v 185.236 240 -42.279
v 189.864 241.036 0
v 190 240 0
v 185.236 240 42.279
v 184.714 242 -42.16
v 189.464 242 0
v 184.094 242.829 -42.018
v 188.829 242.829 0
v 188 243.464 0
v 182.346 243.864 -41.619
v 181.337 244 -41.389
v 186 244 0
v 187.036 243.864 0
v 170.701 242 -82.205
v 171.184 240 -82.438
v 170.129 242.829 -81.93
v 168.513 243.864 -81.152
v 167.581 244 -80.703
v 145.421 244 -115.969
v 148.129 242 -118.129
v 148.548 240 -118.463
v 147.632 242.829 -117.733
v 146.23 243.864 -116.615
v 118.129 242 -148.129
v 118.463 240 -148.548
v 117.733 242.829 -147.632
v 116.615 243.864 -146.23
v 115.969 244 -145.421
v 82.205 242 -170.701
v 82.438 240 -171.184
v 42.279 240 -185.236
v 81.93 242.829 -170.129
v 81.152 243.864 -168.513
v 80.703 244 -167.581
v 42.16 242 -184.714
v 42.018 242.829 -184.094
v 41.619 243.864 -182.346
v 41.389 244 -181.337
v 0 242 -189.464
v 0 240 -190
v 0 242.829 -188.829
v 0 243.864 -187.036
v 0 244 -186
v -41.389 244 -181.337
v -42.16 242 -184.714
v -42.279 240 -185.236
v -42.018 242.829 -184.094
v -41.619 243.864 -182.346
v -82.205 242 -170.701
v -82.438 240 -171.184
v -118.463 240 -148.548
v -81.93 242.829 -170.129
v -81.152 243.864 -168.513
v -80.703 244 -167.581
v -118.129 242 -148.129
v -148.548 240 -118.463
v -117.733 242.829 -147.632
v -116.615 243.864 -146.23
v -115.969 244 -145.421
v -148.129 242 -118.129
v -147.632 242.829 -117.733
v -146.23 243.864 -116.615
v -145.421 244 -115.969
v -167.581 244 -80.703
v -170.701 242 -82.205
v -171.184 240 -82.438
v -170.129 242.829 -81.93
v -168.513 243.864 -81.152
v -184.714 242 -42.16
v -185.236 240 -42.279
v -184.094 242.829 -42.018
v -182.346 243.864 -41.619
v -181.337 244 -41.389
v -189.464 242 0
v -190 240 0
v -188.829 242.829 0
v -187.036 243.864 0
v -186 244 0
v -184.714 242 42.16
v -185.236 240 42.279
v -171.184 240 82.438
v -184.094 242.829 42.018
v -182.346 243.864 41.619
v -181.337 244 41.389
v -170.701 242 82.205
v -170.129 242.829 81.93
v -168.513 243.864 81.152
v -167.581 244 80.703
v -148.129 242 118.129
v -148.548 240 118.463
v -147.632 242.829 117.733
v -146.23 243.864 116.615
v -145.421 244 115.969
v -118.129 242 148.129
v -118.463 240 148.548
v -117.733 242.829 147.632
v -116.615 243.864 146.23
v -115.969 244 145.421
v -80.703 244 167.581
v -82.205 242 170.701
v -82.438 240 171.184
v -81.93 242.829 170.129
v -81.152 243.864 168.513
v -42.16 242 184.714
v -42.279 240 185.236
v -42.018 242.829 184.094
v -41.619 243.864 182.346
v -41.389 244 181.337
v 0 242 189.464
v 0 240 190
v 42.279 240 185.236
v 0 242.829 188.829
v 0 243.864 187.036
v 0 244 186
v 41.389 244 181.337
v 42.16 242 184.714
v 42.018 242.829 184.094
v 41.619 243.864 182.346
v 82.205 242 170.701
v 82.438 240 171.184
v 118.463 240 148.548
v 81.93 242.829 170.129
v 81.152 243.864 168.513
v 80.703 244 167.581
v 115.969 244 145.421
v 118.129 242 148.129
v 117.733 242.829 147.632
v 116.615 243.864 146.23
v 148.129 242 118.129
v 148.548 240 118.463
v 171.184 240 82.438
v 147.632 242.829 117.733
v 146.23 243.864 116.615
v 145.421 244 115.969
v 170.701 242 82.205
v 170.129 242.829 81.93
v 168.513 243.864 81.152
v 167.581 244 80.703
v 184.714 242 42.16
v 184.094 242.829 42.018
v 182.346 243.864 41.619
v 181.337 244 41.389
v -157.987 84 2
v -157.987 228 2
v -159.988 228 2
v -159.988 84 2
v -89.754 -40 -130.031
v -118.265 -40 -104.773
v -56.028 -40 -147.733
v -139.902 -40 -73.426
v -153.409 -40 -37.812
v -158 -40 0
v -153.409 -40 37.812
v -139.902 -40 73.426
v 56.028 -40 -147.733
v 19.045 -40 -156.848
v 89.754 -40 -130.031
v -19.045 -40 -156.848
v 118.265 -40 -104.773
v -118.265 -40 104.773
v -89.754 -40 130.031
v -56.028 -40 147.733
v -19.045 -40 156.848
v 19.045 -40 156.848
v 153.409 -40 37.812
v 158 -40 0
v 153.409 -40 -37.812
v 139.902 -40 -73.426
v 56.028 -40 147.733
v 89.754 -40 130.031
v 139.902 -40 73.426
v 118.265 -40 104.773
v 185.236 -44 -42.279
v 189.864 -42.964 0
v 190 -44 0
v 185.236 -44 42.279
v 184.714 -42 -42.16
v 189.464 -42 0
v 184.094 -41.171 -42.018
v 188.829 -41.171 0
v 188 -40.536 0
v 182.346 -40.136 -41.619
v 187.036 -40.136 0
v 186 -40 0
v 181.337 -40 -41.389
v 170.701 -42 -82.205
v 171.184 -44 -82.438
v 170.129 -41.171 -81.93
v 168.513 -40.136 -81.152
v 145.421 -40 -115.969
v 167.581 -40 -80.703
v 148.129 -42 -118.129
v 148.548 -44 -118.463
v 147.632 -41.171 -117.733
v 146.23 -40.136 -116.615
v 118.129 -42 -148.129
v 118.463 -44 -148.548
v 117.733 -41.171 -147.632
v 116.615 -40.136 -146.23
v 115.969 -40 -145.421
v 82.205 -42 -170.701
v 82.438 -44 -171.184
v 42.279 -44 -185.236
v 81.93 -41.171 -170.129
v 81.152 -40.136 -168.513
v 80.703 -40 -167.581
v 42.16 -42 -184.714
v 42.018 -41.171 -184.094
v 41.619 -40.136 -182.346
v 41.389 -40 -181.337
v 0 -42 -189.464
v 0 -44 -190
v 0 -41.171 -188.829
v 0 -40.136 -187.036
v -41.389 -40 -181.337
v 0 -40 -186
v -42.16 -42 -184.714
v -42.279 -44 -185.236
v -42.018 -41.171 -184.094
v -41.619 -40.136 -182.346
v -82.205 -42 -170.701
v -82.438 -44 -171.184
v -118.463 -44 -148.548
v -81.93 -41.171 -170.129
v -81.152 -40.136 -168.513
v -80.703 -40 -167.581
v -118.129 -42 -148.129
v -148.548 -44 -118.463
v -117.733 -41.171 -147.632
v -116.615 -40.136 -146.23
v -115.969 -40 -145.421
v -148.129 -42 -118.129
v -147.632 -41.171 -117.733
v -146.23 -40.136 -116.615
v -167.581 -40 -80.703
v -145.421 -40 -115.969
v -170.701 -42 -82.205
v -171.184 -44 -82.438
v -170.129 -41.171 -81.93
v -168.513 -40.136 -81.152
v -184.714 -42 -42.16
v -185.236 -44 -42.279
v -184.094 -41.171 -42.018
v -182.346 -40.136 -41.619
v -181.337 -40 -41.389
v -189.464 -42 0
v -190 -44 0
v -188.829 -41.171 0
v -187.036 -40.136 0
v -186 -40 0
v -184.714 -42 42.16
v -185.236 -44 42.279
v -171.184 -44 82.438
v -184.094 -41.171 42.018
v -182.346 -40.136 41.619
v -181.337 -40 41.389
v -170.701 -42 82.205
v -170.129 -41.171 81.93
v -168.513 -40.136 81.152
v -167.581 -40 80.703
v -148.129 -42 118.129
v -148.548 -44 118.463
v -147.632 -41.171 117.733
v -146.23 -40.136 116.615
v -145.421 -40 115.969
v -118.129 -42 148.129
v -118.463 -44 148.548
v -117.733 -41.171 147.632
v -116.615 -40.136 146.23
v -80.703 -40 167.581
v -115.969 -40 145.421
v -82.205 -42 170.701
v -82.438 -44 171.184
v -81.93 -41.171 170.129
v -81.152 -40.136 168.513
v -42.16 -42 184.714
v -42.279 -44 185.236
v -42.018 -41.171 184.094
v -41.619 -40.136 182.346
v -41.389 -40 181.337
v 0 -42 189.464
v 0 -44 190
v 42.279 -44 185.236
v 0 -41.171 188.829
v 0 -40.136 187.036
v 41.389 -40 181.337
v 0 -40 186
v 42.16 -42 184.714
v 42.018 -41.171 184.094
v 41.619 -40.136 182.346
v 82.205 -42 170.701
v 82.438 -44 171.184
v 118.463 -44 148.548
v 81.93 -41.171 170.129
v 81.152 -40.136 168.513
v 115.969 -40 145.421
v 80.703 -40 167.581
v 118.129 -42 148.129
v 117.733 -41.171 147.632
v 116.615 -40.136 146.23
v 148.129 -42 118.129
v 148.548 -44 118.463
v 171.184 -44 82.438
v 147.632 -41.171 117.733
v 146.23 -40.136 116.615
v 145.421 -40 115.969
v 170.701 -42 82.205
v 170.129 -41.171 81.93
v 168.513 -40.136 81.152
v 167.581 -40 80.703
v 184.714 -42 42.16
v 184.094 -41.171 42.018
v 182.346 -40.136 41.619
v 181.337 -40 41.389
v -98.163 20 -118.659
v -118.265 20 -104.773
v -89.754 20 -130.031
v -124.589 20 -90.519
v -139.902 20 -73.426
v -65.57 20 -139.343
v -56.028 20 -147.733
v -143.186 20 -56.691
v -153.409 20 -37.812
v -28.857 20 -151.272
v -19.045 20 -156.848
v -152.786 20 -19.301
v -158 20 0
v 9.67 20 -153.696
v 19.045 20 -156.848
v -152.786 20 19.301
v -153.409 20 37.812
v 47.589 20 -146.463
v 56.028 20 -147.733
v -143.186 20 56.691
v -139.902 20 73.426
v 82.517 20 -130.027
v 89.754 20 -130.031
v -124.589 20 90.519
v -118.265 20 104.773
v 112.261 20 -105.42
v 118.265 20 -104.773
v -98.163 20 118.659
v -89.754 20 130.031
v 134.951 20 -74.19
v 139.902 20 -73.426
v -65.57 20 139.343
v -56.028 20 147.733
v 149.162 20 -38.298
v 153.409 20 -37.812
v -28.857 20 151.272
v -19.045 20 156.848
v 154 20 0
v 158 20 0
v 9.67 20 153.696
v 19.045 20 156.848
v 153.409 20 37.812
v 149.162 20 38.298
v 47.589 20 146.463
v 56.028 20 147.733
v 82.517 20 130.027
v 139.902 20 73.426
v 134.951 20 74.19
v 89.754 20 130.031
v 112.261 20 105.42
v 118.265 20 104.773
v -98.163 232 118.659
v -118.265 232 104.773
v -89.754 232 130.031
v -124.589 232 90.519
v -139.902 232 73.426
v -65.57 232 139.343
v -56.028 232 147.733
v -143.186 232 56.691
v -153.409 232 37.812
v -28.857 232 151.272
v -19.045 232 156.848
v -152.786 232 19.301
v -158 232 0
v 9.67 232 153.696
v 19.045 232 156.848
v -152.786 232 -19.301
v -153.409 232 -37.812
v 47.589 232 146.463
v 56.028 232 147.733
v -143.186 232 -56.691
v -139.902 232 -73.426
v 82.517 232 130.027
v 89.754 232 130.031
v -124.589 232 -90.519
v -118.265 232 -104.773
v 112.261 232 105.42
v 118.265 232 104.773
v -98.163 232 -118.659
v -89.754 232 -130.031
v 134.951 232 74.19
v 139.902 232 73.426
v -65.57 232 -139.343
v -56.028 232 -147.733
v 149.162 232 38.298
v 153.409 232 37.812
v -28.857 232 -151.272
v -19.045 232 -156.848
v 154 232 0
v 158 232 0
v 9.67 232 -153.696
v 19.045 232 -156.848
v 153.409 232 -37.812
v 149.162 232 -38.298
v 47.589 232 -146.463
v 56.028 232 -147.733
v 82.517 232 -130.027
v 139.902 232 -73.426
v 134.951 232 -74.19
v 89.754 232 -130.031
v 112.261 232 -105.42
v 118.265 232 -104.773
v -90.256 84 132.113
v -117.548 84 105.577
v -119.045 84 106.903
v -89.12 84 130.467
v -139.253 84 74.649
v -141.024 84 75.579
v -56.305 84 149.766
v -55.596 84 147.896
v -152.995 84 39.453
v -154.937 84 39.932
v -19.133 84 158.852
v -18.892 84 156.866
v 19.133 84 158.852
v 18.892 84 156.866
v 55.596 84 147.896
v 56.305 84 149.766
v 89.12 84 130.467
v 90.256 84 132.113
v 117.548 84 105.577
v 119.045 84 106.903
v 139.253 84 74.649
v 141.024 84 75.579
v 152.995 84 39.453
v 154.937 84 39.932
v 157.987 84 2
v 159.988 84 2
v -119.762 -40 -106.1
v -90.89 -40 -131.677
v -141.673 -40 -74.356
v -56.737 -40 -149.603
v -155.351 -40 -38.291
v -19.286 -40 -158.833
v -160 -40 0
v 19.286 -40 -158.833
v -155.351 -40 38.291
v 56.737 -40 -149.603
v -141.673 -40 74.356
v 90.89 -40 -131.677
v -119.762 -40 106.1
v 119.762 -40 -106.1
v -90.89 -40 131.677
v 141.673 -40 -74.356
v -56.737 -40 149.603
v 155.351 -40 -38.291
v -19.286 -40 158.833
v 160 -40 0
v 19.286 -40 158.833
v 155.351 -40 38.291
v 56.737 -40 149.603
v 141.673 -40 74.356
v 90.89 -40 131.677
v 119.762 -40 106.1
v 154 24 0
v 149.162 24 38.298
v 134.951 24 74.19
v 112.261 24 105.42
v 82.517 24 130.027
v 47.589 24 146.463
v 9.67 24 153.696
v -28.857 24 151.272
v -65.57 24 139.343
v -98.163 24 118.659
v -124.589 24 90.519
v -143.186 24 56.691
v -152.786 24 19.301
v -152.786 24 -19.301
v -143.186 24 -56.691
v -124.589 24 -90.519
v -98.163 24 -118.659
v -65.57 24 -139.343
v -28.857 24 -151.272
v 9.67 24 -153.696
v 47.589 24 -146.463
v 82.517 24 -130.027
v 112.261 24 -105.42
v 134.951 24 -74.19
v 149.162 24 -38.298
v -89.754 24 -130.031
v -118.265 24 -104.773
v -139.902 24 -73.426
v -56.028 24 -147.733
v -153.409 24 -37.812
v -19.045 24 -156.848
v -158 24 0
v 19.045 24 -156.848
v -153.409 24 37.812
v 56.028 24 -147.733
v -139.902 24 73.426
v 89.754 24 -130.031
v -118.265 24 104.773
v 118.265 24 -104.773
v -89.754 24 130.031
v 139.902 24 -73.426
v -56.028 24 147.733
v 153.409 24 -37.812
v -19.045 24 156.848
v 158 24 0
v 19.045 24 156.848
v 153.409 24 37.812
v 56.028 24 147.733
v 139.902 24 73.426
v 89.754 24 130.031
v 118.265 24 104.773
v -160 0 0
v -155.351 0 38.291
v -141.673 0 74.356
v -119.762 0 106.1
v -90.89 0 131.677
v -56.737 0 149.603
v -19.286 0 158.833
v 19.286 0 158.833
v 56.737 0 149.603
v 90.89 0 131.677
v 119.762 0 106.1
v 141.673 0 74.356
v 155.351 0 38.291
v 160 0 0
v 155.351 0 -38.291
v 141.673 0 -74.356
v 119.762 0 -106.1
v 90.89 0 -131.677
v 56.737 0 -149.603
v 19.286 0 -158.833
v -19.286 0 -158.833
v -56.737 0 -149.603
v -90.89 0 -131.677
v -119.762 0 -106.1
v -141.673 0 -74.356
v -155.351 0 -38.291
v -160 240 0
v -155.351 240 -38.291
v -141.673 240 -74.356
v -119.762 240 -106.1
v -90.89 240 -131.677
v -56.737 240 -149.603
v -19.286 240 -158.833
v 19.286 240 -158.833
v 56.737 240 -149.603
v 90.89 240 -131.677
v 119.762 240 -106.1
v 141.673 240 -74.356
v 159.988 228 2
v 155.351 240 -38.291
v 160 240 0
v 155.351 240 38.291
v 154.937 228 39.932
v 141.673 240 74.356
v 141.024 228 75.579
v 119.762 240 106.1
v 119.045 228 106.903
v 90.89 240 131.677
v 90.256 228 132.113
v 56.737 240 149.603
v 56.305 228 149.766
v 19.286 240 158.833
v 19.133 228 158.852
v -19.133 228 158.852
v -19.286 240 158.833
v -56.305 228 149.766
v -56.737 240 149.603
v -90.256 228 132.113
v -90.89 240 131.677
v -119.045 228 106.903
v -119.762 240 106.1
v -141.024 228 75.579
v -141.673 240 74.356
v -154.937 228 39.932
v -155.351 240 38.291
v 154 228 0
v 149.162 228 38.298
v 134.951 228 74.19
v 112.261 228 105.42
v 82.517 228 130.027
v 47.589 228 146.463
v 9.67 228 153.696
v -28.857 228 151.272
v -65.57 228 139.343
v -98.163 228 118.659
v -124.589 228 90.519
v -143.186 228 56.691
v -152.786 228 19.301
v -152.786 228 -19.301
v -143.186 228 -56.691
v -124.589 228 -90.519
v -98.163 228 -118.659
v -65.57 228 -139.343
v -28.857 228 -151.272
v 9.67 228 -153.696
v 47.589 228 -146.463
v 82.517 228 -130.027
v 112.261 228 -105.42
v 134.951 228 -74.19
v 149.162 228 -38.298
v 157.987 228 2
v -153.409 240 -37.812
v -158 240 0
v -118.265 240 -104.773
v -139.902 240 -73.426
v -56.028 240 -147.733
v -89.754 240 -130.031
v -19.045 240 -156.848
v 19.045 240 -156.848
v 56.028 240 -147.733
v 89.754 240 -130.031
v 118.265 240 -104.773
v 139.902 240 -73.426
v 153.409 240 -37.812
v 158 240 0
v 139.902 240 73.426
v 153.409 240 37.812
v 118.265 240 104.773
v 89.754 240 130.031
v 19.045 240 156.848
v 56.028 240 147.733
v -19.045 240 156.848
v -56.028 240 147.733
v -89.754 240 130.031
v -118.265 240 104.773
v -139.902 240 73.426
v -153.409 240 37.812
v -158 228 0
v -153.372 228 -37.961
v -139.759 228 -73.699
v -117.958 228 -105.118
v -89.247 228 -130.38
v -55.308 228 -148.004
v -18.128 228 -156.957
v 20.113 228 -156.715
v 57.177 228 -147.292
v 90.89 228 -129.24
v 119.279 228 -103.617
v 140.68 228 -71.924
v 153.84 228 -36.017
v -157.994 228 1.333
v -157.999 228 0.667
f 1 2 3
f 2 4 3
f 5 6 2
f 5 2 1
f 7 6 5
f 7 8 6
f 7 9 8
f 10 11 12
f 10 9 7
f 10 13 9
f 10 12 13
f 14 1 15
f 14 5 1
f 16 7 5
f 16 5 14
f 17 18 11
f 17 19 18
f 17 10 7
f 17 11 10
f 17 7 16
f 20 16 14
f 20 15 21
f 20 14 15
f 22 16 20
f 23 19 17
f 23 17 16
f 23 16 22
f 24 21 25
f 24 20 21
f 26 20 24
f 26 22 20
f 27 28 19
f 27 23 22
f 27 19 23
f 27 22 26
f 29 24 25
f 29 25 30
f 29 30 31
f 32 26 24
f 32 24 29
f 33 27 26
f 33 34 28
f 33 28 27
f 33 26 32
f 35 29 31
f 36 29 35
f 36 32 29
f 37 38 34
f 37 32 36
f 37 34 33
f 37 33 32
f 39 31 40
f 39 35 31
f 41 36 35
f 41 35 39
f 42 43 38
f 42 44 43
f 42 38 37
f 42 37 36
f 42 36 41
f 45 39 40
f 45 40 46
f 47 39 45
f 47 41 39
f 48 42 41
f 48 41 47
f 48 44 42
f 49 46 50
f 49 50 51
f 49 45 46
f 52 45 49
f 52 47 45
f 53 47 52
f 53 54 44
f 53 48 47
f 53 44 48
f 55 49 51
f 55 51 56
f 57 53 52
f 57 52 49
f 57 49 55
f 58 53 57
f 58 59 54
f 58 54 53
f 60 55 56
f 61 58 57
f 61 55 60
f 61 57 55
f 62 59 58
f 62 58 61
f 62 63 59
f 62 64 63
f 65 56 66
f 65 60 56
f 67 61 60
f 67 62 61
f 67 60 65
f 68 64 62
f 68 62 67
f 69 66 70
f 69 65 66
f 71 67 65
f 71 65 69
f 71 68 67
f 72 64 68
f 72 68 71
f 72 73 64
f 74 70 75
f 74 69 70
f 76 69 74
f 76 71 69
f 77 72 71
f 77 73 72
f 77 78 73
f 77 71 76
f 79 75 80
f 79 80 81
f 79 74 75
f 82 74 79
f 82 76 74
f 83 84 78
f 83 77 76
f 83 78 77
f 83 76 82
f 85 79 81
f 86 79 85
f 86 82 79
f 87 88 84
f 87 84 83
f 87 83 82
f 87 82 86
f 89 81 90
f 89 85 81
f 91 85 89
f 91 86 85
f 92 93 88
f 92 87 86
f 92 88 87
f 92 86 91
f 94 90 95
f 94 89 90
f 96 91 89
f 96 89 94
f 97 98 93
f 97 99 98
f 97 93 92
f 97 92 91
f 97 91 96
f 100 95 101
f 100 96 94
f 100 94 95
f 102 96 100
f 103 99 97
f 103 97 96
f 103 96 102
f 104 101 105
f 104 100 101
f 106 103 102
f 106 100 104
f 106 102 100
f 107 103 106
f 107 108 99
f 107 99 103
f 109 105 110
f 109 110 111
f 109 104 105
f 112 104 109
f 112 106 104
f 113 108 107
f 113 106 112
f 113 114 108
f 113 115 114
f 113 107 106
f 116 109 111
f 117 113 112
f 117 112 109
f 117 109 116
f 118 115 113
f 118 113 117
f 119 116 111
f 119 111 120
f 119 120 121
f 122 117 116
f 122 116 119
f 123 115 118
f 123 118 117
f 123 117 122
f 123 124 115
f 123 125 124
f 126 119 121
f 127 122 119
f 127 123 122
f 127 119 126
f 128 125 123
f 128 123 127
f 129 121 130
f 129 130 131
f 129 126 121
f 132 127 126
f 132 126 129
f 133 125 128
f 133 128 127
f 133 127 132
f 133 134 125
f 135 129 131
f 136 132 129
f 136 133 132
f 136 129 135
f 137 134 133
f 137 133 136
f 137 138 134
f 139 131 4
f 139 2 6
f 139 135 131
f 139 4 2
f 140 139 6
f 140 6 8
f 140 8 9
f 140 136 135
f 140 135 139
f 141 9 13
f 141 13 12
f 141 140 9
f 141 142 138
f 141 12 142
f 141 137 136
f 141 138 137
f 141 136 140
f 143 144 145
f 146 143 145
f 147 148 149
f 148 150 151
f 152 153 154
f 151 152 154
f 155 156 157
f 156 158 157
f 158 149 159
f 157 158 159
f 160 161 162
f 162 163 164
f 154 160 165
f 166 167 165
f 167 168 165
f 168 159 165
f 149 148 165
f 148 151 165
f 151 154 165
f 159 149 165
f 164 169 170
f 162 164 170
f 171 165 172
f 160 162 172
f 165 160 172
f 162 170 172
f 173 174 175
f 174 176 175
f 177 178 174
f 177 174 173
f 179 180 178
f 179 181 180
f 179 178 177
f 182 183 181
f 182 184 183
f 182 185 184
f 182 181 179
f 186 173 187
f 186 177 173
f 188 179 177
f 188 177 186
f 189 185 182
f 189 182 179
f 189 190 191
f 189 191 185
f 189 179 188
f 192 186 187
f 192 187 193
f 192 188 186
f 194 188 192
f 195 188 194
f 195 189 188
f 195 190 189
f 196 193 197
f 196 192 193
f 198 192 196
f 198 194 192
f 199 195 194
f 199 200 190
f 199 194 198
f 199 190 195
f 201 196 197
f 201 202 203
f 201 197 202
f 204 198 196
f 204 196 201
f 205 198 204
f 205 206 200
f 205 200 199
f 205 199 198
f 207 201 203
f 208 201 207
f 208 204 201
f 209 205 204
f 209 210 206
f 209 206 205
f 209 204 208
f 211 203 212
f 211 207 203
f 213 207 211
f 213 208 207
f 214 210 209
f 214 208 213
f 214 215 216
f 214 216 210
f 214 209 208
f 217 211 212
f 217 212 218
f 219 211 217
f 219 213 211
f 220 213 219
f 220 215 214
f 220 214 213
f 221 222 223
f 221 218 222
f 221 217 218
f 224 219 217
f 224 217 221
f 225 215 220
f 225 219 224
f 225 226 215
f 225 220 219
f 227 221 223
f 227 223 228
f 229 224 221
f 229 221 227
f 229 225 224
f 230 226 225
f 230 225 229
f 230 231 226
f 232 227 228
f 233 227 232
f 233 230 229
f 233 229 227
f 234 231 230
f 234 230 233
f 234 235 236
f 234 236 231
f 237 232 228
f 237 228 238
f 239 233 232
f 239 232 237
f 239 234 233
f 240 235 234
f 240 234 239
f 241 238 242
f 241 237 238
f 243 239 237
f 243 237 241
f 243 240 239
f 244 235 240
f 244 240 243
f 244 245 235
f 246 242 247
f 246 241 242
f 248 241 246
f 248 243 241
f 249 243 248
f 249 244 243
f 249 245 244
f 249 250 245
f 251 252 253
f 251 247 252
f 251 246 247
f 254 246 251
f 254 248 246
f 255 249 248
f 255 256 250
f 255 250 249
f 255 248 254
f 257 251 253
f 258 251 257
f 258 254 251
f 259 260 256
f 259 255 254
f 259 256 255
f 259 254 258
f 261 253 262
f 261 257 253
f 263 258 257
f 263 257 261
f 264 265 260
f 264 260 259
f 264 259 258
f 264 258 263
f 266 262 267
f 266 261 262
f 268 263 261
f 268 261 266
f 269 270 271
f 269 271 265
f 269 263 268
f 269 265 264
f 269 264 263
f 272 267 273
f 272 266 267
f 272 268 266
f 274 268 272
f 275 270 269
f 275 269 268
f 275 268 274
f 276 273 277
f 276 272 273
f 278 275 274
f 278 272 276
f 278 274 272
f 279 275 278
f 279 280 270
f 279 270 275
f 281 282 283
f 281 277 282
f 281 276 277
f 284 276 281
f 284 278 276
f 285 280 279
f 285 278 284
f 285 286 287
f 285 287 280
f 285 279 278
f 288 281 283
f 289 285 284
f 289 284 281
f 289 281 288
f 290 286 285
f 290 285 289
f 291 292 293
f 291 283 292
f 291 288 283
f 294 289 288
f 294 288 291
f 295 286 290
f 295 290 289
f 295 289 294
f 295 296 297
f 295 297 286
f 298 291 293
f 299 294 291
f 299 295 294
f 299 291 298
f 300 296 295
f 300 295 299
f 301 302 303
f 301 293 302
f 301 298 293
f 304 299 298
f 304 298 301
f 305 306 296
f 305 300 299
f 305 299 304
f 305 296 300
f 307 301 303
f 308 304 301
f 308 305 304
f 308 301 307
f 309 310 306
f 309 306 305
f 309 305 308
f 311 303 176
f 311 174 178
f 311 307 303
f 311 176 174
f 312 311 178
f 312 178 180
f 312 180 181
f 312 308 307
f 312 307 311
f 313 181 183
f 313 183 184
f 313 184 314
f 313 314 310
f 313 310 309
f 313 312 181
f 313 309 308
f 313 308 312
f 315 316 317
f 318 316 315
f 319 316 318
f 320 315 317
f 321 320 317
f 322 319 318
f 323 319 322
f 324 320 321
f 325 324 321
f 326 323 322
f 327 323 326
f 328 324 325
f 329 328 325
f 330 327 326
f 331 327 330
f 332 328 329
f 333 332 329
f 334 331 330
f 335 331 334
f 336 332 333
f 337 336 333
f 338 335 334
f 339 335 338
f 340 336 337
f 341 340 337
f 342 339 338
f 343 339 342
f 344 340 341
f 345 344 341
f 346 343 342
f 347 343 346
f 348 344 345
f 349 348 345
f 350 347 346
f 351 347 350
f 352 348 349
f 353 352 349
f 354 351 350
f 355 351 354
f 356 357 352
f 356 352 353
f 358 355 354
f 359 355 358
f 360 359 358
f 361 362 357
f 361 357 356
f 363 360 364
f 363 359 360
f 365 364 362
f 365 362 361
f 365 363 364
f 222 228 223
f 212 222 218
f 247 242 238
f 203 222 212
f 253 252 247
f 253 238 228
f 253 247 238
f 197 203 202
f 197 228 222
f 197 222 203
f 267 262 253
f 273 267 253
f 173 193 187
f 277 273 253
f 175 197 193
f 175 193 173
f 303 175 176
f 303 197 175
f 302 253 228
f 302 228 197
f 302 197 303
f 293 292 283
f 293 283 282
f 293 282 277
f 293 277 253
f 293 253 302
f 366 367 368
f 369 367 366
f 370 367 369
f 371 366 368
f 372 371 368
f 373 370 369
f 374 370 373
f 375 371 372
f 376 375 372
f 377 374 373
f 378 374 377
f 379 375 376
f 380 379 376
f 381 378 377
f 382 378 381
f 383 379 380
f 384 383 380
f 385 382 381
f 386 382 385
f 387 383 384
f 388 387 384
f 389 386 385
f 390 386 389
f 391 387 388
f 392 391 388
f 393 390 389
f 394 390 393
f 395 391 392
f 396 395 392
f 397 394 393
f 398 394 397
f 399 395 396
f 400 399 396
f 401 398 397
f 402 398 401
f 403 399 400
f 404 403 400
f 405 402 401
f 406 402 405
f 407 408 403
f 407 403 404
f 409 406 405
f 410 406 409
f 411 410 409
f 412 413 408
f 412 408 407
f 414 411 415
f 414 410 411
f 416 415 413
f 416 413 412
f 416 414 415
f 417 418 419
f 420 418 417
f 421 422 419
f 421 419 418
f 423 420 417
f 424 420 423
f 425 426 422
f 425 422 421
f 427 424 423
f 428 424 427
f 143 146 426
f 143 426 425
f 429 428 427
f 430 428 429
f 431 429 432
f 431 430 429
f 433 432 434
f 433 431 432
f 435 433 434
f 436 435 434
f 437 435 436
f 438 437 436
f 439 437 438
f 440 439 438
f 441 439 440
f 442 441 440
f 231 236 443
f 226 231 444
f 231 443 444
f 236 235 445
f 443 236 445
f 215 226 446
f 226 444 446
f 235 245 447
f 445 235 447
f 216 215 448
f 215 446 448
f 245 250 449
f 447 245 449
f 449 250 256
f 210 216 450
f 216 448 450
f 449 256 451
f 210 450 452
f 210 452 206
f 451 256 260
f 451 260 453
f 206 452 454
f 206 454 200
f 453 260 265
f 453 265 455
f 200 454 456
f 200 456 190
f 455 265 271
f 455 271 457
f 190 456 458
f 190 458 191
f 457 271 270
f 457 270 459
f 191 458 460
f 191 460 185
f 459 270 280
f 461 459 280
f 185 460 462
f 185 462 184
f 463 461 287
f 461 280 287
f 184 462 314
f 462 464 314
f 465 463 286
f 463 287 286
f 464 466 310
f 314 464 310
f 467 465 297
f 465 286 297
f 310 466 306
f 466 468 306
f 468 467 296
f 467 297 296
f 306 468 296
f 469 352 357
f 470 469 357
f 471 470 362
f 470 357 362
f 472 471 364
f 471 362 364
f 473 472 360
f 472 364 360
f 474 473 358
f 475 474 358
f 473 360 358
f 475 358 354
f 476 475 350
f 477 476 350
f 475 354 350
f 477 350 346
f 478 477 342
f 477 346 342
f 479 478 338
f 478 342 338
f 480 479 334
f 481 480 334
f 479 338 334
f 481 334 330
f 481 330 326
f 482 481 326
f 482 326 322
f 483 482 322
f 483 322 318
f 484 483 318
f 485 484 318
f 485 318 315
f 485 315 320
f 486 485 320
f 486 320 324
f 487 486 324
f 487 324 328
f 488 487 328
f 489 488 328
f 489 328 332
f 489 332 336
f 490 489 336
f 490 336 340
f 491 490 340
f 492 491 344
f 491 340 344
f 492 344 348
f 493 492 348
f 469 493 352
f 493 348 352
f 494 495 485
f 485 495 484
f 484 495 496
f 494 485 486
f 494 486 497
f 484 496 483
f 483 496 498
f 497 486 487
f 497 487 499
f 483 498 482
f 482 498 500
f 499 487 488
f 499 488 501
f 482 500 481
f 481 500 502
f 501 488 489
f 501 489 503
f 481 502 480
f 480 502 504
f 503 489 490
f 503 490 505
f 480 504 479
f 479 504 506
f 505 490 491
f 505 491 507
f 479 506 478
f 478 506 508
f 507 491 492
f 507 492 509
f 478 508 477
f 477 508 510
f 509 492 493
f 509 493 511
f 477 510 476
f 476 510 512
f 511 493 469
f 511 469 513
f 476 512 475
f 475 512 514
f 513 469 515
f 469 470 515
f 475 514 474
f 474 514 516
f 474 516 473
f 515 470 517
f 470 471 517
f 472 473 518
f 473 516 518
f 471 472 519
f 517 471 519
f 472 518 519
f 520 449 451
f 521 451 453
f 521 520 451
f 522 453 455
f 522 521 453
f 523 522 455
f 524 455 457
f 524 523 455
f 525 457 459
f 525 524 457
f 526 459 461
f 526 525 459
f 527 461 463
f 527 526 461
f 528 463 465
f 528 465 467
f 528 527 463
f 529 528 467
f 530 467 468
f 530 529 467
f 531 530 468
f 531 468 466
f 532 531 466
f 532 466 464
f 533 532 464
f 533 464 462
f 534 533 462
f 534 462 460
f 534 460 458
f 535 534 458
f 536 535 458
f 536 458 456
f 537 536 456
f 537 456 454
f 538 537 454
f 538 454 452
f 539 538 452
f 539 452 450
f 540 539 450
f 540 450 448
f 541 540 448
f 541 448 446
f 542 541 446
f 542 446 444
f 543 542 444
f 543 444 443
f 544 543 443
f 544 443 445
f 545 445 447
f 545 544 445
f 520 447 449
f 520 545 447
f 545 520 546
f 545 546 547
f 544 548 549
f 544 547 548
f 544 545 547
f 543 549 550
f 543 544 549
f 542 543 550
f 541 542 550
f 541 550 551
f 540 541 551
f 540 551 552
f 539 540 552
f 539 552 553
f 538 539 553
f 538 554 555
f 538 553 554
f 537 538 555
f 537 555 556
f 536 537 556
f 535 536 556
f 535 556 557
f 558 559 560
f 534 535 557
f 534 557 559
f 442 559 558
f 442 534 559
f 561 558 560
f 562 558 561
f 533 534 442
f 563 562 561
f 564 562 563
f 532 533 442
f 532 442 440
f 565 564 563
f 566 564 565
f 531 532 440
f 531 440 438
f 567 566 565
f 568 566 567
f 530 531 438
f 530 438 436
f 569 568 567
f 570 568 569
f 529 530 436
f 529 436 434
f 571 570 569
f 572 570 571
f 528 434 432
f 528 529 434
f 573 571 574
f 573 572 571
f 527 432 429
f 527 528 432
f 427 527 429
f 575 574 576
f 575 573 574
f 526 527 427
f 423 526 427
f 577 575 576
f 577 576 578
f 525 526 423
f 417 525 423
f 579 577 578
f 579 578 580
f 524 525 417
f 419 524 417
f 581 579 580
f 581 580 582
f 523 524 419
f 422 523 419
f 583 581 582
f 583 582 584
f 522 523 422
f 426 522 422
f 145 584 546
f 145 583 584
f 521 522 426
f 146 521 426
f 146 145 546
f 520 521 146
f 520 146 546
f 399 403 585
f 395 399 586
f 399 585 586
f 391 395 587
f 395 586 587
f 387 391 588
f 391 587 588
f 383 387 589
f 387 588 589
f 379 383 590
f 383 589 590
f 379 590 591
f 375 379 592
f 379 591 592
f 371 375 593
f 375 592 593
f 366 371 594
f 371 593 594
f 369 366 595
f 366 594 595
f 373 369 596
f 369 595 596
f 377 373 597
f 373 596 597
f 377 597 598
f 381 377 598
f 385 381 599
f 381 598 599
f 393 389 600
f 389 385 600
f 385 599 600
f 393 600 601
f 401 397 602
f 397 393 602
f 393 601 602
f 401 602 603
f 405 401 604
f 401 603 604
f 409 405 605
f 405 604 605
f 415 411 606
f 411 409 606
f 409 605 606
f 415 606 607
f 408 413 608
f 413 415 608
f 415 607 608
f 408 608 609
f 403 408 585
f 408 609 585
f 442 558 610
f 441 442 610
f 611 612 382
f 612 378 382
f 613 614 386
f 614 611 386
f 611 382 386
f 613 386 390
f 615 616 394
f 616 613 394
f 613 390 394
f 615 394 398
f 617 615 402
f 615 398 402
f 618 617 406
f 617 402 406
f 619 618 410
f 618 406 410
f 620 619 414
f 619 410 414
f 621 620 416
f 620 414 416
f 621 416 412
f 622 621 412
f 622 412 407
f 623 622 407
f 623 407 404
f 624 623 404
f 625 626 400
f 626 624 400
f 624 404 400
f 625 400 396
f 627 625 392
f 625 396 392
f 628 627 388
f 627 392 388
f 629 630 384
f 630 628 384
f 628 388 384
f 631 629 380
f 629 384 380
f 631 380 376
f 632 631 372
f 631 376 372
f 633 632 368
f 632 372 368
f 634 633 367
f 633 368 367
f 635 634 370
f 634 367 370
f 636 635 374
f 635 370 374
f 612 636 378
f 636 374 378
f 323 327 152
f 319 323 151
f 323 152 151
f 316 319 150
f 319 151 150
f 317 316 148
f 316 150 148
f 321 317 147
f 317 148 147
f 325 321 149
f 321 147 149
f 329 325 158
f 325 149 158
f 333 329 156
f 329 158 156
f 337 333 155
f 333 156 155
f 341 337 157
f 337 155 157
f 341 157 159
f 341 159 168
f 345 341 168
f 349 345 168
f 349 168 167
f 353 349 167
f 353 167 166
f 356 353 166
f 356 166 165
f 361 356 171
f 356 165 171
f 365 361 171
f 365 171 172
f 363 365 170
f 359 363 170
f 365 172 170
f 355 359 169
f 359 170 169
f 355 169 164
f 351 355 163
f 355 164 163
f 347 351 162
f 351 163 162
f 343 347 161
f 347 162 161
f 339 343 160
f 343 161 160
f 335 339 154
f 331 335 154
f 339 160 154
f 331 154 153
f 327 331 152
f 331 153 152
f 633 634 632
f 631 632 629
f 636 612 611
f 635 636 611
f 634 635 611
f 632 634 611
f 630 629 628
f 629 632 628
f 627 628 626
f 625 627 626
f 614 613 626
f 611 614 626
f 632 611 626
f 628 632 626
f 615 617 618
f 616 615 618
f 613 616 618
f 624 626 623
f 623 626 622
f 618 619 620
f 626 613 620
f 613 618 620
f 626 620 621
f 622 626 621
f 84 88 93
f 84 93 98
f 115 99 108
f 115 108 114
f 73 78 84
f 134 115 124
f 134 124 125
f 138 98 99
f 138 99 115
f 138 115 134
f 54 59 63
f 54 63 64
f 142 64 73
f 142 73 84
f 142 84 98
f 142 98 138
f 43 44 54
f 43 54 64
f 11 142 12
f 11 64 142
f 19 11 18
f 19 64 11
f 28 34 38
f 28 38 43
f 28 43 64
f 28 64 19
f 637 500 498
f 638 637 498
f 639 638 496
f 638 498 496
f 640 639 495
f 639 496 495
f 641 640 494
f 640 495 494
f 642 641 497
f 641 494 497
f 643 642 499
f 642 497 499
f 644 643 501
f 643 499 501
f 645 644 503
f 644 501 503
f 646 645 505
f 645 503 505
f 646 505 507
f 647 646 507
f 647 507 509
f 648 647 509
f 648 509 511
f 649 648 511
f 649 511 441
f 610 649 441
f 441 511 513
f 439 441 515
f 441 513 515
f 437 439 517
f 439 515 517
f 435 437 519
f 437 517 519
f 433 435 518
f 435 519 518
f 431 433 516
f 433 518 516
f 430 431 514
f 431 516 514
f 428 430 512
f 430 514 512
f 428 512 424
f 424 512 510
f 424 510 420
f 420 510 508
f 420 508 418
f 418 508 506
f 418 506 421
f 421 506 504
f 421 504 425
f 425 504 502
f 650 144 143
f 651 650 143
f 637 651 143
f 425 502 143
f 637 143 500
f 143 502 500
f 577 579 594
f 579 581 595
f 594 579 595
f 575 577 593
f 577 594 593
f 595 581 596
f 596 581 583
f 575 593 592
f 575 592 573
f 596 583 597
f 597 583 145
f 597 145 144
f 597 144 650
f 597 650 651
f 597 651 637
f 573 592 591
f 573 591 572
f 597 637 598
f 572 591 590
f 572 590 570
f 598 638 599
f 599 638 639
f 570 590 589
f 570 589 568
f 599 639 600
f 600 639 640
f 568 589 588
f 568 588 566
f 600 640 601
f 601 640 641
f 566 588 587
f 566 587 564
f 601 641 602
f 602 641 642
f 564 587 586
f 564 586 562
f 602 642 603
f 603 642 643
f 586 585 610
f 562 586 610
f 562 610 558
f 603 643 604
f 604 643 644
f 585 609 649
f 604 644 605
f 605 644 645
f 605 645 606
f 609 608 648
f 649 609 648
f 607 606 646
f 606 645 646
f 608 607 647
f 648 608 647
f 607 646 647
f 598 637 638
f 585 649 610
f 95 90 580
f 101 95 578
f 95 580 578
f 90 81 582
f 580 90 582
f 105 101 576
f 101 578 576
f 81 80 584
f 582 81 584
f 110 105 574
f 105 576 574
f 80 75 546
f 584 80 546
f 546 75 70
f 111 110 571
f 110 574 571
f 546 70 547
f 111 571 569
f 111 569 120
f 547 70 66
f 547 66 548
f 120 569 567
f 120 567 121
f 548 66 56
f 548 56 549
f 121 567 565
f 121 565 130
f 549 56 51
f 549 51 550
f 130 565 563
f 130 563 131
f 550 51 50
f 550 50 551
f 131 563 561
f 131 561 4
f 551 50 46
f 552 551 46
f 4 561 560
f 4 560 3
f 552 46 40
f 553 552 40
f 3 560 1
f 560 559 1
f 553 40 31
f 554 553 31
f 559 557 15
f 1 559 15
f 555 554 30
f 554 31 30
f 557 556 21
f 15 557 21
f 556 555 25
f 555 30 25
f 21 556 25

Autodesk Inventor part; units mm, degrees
ref_plane "YZ Plane" through (0, 0, 0) normal (1, 0, 0) x (0, 1, 0)
sketch "Sketch1" plane through (0, 0, 0) normal (0, 1, 0) x (-1, 0, 0)
  circle A0 centre (0, 0) radius 158
  circle A1 centre (0, 0) radius 160
  dimension "d0" = 316
  dimension "d1" = 320
extrude "Extrusion1" add sketch "Sketch1" along normal blind 240 and the other way blind 40
ref_plane "Work Plane1" through (0, 20, 0) normal (0, -1, 0) x (1, 0, 0)
sketch "Sketch3" plane through (0, 20, 0) normal (0, -1, 0) x (1, 0, 0)
  circle A0 centre (0, 0) radius 158
  circle A1 centre (0, 0) radius 154
  dimension "d8" = 308
  dimension "d16" = 316
extrude "Extrusion3" add sketch "Sketch3" against normal blind 4
ref_plane "Work Plane2" through (0, 228, 0) normal (0, 1, 0) x (1, 0, 0)
sketch "Sketch4" plane through (0, 228, 0) normal (0, 1, 0) x (1, 0, 0)
  circle A0 centre (0, 0) radius 158
  circle A1 centre (0, 0) radius 154
  dimension "d12" = 316
  dimension "d13" = 308
extrude "Extrusion4" add sketch "Sketch4" along normal blind 4
sketch "Sketch5" plane through (0, 228, 0) normal (0, 1, 0) x (1, 0, 0)
  line L0 (159.9875, -2) -> (-159.9875, -2)
  circle A0 centre (0, 0) radius 160 projected
  arc A1 (-159.9875, -2) -> (159.9875, -2) centre (0, 0) ccw
  dimension "d17" = 2
extrude "Extrusion5" cut sketch "Sketch5" against normal blind 144 contours A0 L0 picked at (22.9687, -49.4673)
sketch "Sketch6" plane through (0, 240, 0) normal (0, 1, 0) x (1, 0, 0)
  circle A0 centre (0, 0) radius 190
  dimension "d22" = 380
extrude "Extrusion6" add sketch "Sketch6" along normal blind 4
fillet "Fillet1" radius 4 1 edges at (-190, 244, 0)
sketch "Sketch7" plane through (0, -40, 0) normal (0, -1, 0) x (1, 0, 0)
  circle A0 centre (0, 0) radius 190
  dimension "d26" = 380
extrude "Extrusion7" add sketch "Sketch7" along normal blind 4
fillet "Fillet2" radius 4 1 edges at (-190, -40, 0)
properties part number "OuterCover" material "Aluminum 6061"
